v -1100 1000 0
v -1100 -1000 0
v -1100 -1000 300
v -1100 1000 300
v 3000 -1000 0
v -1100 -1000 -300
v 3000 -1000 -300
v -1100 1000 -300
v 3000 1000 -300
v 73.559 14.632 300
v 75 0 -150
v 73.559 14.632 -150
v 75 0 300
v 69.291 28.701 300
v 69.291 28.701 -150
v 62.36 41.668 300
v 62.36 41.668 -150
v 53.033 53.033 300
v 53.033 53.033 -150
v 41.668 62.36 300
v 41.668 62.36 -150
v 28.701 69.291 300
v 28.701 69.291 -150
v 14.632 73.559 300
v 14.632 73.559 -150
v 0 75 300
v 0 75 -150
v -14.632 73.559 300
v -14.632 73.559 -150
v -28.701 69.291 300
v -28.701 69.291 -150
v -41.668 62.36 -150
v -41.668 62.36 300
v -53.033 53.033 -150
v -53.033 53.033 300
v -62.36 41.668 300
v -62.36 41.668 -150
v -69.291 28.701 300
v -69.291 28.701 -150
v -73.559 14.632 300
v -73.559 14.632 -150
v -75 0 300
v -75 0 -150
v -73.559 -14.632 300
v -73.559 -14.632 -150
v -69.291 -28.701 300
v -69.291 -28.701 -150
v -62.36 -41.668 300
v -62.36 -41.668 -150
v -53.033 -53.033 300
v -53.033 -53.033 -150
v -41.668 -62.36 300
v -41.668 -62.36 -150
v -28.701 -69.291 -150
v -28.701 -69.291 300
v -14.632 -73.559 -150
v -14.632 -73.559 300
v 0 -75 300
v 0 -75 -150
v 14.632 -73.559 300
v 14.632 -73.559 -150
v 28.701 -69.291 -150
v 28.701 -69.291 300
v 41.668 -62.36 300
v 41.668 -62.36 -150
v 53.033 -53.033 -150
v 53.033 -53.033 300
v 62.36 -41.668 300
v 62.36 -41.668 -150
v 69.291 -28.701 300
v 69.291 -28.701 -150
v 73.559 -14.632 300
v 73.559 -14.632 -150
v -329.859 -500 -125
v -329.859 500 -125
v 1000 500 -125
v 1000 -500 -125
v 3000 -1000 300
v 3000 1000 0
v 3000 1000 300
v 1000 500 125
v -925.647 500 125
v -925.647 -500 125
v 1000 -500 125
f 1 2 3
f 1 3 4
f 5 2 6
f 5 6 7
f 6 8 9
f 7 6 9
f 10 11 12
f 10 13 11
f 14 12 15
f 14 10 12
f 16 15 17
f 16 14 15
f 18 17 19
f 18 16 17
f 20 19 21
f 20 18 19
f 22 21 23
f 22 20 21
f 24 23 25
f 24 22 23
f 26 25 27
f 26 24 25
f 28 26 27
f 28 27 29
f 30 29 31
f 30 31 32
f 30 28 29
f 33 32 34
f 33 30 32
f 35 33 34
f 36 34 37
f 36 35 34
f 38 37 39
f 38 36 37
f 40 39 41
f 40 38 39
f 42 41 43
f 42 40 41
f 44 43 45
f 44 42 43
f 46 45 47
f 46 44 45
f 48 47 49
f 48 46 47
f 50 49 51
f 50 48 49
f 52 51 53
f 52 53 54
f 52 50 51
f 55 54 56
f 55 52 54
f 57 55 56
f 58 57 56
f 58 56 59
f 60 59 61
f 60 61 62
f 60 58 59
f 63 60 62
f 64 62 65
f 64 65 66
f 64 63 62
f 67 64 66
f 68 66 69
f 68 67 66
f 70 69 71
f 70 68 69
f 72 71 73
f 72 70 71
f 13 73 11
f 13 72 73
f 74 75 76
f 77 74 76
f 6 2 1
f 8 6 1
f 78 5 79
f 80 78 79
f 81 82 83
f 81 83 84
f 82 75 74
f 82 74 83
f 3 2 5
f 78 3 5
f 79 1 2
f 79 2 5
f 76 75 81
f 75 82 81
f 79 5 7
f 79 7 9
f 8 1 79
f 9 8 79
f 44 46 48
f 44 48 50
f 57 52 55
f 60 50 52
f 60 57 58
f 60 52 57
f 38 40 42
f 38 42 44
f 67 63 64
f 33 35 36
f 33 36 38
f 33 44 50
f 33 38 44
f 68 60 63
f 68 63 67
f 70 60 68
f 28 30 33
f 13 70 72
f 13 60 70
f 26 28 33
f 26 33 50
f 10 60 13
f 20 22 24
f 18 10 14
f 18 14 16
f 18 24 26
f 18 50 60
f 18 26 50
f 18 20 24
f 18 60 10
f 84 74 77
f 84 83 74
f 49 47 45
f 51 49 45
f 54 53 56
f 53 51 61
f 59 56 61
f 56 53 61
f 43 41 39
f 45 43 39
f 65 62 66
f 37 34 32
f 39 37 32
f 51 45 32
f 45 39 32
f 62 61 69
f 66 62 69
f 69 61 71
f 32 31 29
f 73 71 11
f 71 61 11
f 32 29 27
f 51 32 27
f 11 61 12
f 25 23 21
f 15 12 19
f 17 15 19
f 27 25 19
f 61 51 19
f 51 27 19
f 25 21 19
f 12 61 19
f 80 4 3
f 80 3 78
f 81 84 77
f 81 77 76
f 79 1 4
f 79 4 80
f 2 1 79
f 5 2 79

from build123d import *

# Parameters (mm, degrees)
F0_W          = 2000
F0_H          = 1000
F1_DEPTH      = 125
F2_W          = 4100
F2_H          = 2000
F3_DEPTH      = 300
F4_DEPTH      = 300
F6_DEPTH      = 1000
F7_R          = 75
F8_DEPTH      = 300
F8_DEPTH_BACK = 150


with BuildPart() as f1:
    # F0 (on Top) → F1 (new body, symmetric)
    with BuildSketch(Plane.XY):
        Rectangle(F0_W, F0_H)
    extrude(amount=F1_DEPTH, both=True)

    # F5 (on face) → F6 (cut, through all)
    with BuildSketch(Plane.XZ.offset(500)):
        Polygon((-329.8588991165, -125), (-1000, 156.1994105577), (-1000, -125), align=None)
    extrude(amount=-F6_DEPTH, mode=Mode.SUBTRACT)


with BuildPart() as f3:
    # F2 (on Top) → F3 (new body)
    with BuildSketch(Plane.XY):
        with Locations((950, 0)):
            Rectangle(F2_W, F2_H)
    extrude(amount=F3_DEPTH)


with BuildPart() as f4:
    # F2 (on Top) → F4 (new body)
    with BuildSketch(Plane.XY):
        with Locations((950, 0)):
            Rectangle(F2_W, F2_H)
    extrude(amount=-F4_DEPTH)


with BuildPart() as f8:
    # F7 (on Top) → F8 (new body, two sides)
    with BuildSketch(Plane.XY) as f8_sk:
        Circle(F7_R)
    extrude(amount=F8_DEPTH)
    extrude(f8_sk.sketch, amount=-F8_DEPTH_BACK)


solid = Compound([f1.part, f3.part, f4.part, f8.part])
